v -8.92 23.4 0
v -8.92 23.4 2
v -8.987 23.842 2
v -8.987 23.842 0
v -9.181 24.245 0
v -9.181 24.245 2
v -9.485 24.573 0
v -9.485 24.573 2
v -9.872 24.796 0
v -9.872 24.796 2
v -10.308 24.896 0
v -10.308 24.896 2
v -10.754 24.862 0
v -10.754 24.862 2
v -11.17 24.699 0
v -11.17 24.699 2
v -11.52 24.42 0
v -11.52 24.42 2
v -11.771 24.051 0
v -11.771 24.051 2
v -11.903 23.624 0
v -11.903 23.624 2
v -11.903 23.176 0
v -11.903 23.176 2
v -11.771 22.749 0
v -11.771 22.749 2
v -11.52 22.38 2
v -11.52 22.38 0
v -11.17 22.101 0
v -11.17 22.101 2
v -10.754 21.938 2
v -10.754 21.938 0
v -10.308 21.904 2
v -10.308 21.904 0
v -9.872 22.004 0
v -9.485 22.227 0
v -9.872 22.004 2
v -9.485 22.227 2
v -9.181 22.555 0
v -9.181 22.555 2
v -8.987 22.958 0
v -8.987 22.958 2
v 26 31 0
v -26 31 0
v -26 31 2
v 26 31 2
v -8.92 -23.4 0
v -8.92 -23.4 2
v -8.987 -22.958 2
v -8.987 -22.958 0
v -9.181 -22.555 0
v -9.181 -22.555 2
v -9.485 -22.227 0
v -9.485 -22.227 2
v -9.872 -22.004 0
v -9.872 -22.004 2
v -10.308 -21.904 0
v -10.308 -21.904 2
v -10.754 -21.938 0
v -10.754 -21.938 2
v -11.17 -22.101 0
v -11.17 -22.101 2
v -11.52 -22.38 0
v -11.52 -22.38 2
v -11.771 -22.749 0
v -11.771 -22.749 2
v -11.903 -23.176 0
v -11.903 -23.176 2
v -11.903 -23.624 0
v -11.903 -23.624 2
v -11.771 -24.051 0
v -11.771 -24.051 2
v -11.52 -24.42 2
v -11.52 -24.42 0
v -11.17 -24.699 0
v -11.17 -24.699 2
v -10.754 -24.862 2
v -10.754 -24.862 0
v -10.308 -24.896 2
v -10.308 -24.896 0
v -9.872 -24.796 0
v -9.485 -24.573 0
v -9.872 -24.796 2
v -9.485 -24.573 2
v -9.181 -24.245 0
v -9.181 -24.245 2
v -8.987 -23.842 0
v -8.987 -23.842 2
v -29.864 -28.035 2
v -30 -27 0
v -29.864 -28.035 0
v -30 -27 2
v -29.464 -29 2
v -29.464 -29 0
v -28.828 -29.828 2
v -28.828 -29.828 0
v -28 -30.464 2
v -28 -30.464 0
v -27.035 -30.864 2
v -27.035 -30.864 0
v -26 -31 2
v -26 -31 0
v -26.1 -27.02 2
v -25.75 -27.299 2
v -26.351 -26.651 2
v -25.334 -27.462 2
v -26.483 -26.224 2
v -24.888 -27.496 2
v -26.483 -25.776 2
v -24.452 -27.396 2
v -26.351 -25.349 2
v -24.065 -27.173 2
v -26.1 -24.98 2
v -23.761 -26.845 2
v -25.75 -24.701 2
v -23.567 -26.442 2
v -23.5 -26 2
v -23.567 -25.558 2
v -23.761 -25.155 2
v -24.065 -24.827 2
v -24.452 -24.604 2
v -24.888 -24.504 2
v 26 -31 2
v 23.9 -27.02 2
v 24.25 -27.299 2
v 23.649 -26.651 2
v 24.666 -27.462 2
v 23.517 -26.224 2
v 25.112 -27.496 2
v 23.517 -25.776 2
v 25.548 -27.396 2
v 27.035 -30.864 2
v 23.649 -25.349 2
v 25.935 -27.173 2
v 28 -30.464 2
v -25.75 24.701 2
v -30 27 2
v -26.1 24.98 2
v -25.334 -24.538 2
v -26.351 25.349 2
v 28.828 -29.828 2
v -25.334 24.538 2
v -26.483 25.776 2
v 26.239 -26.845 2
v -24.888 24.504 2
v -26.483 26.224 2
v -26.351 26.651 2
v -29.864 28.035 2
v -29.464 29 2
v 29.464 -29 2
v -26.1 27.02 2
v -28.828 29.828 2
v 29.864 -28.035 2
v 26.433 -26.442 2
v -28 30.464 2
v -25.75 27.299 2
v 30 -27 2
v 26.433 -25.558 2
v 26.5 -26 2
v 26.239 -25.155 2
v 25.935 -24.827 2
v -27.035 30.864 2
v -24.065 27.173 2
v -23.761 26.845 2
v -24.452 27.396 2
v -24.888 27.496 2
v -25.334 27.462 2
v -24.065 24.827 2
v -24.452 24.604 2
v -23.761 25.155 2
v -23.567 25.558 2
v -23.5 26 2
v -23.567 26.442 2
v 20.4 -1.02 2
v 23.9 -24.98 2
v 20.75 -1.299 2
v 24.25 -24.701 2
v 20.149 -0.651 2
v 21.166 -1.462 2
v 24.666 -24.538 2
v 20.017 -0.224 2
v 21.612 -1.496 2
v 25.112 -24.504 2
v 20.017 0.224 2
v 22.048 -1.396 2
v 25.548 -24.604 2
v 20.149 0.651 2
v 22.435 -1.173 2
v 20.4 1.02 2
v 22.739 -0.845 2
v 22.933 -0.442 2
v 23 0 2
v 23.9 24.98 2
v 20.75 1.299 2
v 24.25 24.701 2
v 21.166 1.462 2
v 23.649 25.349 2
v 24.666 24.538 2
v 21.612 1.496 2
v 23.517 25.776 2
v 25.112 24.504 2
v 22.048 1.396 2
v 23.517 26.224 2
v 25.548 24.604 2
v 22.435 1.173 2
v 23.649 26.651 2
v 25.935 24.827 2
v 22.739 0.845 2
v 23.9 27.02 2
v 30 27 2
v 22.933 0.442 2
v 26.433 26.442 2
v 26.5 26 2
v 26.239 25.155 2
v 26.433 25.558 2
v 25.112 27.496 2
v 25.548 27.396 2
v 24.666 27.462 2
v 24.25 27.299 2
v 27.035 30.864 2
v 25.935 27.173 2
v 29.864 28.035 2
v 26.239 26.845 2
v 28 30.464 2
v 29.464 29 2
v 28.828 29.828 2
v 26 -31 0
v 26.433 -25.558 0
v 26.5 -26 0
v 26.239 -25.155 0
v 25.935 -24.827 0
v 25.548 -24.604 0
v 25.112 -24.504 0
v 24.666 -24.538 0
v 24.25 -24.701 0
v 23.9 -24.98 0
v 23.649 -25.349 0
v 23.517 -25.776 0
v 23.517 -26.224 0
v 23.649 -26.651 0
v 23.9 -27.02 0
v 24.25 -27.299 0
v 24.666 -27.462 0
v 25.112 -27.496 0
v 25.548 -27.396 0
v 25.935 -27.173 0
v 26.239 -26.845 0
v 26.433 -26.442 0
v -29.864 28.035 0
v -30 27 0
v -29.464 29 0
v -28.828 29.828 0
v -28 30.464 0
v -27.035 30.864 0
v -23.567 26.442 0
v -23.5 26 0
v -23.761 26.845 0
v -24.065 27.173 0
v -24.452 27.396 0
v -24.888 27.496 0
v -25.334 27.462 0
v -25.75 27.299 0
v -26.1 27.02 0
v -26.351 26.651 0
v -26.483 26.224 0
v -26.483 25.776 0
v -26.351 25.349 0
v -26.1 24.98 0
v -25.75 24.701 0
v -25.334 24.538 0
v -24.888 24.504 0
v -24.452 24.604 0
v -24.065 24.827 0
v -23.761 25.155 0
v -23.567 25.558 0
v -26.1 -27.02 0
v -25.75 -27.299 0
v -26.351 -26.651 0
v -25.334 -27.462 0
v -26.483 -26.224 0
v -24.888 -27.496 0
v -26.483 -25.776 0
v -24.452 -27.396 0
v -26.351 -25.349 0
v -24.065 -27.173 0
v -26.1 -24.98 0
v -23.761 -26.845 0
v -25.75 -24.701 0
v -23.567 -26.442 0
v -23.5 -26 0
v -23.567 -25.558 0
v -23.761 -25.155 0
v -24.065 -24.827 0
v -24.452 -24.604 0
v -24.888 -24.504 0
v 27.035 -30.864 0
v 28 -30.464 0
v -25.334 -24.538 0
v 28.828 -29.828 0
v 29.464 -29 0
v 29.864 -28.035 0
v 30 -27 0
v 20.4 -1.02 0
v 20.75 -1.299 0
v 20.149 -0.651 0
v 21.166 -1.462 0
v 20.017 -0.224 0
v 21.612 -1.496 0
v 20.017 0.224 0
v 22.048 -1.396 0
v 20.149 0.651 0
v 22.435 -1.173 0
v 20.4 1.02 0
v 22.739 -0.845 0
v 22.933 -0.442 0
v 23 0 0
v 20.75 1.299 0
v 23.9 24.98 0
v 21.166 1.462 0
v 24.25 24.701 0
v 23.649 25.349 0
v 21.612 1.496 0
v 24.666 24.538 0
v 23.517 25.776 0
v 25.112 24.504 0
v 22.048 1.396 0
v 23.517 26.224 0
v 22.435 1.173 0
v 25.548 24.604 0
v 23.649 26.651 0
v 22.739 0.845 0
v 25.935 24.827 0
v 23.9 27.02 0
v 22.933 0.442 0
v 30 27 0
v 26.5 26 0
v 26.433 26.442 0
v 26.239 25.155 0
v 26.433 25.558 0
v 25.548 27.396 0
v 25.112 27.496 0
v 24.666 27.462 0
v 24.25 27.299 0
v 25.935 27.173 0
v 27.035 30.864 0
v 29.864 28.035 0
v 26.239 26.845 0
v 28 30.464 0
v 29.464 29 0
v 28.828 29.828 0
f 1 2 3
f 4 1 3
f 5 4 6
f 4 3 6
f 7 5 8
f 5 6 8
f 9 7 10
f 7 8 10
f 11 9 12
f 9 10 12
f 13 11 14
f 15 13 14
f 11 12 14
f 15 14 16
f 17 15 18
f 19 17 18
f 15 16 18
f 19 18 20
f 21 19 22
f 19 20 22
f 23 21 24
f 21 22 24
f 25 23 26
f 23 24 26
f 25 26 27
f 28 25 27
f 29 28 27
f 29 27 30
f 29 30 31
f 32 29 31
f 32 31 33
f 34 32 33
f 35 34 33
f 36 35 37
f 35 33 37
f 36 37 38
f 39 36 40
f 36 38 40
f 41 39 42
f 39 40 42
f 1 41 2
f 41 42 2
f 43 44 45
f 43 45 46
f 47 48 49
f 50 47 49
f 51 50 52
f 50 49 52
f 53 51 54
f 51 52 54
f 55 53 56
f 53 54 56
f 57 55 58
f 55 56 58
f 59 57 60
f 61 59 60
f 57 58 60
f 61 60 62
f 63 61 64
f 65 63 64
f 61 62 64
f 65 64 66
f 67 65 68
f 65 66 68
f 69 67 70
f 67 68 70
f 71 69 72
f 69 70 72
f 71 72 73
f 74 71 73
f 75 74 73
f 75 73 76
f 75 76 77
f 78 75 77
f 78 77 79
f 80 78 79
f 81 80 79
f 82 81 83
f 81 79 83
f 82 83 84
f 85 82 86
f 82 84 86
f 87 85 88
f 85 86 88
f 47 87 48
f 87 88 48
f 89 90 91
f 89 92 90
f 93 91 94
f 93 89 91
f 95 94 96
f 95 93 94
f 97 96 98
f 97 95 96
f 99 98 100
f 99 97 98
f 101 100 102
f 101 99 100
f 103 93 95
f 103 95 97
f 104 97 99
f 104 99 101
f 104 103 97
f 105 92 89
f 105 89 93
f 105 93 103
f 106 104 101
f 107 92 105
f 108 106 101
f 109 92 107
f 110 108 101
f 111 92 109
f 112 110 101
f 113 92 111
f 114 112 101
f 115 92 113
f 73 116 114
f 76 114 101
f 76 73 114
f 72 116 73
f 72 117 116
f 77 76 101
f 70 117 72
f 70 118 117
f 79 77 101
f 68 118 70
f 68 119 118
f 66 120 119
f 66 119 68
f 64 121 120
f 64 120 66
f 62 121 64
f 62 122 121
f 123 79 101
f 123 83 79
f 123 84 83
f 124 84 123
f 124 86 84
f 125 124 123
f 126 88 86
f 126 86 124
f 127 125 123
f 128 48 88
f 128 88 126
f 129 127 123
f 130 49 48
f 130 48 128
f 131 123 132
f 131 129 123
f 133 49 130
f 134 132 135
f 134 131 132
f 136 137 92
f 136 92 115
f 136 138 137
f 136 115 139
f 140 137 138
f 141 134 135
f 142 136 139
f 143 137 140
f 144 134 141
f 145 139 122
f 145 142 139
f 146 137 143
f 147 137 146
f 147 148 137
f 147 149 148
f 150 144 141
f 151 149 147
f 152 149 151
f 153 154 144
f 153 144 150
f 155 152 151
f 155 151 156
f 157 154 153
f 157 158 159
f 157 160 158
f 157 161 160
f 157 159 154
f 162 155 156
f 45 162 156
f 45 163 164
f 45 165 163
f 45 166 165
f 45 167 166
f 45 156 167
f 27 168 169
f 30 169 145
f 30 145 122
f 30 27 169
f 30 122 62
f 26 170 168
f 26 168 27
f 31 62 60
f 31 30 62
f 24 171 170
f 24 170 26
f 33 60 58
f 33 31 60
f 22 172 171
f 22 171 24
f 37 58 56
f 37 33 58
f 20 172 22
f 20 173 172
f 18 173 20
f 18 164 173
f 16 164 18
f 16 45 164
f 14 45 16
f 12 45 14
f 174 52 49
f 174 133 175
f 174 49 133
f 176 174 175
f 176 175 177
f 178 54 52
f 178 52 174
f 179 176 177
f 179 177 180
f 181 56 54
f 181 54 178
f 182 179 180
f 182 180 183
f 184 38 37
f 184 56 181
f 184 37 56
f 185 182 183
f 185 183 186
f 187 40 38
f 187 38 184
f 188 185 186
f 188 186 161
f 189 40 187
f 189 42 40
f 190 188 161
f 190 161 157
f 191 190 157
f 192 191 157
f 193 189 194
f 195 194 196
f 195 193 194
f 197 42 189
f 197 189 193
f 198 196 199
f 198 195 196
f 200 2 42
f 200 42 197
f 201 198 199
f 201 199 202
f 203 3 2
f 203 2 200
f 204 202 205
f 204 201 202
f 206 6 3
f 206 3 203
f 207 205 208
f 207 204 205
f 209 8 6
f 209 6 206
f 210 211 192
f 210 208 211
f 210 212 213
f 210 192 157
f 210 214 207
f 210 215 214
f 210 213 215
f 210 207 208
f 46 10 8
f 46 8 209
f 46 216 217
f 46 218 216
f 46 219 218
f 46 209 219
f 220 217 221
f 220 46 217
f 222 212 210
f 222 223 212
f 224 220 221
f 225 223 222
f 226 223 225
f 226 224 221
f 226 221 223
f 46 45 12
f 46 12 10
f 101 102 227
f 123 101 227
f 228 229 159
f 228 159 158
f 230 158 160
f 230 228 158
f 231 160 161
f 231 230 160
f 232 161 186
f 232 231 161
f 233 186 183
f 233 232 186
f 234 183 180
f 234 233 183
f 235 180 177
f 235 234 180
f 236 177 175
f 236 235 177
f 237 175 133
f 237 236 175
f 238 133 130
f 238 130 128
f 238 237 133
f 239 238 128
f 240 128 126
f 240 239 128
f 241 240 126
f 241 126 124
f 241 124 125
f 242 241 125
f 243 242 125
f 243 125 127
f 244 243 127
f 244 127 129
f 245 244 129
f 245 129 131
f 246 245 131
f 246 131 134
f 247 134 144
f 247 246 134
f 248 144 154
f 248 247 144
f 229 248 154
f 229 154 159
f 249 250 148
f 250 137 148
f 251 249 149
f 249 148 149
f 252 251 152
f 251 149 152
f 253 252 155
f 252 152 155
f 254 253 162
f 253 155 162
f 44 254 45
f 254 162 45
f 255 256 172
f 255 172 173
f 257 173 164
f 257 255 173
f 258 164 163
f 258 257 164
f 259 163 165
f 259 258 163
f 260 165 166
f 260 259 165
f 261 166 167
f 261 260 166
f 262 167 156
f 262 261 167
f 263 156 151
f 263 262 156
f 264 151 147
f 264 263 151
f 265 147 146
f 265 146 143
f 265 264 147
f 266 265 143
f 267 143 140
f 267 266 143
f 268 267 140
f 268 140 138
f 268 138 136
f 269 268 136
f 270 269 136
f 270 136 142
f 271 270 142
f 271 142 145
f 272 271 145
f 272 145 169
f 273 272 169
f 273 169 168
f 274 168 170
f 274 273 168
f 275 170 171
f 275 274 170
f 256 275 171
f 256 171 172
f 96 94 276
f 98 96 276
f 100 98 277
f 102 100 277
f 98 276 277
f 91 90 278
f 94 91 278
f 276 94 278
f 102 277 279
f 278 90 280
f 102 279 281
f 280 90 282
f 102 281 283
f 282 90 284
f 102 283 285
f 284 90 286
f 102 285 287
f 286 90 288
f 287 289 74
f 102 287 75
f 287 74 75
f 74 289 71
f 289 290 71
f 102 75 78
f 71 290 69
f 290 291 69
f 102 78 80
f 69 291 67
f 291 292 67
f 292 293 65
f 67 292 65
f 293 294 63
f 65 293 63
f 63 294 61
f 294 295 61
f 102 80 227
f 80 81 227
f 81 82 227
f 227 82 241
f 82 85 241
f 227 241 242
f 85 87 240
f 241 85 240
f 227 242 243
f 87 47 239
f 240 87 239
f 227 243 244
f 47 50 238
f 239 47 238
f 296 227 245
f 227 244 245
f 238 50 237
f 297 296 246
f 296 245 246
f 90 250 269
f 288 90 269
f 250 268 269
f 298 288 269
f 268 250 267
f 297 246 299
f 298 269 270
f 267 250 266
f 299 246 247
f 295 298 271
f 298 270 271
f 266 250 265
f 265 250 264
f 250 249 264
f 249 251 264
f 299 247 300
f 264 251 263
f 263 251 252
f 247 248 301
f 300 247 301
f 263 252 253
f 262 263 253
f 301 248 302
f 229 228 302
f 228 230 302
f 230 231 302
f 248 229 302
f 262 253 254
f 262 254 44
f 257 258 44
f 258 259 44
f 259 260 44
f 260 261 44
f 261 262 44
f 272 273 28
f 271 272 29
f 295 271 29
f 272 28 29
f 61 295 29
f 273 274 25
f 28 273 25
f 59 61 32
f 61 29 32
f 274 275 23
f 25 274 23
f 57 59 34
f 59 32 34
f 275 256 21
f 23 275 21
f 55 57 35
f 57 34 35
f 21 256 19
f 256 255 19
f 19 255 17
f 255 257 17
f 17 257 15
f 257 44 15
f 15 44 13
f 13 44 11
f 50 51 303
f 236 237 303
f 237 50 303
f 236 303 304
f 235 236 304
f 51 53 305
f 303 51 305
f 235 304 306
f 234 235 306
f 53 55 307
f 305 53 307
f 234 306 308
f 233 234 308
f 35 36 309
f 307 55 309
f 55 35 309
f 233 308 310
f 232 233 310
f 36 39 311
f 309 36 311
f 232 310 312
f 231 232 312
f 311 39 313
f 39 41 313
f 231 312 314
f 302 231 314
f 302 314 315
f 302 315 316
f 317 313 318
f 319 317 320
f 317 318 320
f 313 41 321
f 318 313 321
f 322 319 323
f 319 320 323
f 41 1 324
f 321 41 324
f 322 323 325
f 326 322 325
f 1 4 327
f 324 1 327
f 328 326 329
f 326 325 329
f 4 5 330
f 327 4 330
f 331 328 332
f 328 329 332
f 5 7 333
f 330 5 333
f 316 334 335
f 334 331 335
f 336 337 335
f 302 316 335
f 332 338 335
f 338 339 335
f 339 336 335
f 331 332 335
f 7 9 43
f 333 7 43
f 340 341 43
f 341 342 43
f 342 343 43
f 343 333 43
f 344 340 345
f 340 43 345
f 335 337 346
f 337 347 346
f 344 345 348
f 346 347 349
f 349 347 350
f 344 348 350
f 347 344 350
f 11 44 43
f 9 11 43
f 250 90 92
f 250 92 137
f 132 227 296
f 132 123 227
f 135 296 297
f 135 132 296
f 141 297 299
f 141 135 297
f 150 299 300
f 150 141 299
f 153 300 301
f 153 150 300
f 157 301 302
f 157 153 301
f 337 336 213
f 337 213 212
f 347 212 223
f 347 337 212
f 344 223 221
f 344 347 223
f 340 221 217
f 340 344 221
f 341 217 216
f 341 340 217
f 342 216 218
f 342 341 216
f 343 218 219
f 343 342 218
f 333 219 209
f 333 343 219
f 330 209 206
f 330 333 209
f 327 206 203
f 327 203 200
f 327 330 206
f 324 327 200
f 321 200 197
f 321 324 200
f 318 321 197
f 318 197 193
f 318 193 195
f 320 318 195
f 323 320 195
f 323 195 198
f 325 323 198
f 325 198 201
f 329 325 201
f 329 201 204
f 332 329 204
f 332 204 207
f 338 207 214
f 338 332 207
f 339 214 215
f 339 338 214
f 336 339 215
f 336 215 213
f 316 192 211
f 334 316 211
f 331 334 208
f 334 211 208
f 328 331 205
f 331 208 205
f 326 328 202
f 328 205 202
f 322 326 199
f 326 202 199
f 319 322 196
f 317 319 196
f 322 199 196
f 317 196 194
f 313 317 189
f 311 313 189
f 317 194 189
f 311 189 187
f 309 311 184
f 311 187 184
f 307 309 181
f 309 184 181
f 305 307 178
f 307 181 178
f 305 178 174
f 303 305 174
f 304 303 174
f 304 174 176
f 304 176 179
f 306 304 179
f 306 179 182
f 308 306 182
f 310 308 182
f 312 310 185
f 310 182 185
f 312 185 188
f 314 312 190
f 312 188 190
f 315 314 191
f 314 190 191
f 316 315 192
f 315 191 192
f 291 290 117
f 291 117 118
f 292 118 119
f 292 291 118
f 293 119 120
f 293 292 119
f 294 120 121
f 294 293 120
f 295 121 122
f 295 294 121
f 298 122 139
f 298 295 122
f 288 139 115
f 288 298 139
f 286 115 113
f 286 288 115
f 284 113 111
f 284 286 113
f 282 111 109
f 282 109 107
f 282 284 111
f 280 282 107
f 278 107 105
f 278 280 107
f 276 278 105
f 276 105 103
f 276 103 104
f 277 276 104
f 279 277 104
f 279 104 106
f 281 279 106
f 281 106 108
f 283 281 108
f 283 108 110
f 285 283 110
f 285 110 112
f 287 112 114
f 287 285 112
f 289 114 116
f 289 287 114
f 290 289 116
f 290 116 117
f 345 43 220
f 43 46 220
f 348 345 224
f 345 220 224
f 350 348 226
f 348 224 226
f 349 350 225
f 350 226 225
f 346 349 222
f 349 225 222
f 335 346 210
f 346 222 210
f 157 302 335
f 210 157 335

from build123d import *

# Parameters (mm, degrees)
CROQUIS1_W              = 60
CROQUIS1_H              = 62
CROQUIS1_R              = 1.5
SALIENTE_EXTRUIR1_DEPTH = 2
REDONDEO1_R             = 4
CROQUIS3_R              = 1.5
CORTAR_EXTRUIR1_DEPTH   = 2


with BuildPart() as part:
    # Croquis1 → Saliente-Extruir1 (new body)
    with BuildSketch(Plane.XY):
        Rectangle(CROQUIS1_W, CROQUIS1_H)
        with Locations((-25, -26)):
            Circle(CROQUIS1_R, mode=Mode.SUBTRACT)
        with Locations((25, -26)):
            Circle(CROQUIS1_R, mode=Mode.SUBTRACT)
        with Locations((25, 26)):
            Circle(CROQUIS1_R, mode=Mode.SUBTRACT)
        with Locations((-25, 26)):
            Circle(CROQUIS1_R, mode=Mode.SUBTRACT)
    extrude(amount=SALIENTE_EXTRUIR1_DEPTH)

    # Redondeo1
    redondeo1_edges = [part.edges().sort_by_distance(p)[0] for p in [
        (-30, -31, 1),
        (-30, 31, 1),
        (30, 31, 1),
        (30, -31, 1),
    ]]
    fillet(redondeo1_edges, radius=REDONDEO1_R)

    # Croquis3 → Cortar-Extruir1 (cut)
    with BuildSketch(Plane.XY.offset(2)):
        with Locations((-10.42, 23.4)):
            Circle(CROQUIS3_R)
        with Locations((-10.42, -23.4)):
            Circle(CROQUIS3_R)
        with Locations((21.5, 0)):
            Circle(CROQUIS3_R)
    extrude(amount=-CORTAR_EXTRUIR1_DEPTH, mode=Mode.SUBTRACT)


solid = part.part
